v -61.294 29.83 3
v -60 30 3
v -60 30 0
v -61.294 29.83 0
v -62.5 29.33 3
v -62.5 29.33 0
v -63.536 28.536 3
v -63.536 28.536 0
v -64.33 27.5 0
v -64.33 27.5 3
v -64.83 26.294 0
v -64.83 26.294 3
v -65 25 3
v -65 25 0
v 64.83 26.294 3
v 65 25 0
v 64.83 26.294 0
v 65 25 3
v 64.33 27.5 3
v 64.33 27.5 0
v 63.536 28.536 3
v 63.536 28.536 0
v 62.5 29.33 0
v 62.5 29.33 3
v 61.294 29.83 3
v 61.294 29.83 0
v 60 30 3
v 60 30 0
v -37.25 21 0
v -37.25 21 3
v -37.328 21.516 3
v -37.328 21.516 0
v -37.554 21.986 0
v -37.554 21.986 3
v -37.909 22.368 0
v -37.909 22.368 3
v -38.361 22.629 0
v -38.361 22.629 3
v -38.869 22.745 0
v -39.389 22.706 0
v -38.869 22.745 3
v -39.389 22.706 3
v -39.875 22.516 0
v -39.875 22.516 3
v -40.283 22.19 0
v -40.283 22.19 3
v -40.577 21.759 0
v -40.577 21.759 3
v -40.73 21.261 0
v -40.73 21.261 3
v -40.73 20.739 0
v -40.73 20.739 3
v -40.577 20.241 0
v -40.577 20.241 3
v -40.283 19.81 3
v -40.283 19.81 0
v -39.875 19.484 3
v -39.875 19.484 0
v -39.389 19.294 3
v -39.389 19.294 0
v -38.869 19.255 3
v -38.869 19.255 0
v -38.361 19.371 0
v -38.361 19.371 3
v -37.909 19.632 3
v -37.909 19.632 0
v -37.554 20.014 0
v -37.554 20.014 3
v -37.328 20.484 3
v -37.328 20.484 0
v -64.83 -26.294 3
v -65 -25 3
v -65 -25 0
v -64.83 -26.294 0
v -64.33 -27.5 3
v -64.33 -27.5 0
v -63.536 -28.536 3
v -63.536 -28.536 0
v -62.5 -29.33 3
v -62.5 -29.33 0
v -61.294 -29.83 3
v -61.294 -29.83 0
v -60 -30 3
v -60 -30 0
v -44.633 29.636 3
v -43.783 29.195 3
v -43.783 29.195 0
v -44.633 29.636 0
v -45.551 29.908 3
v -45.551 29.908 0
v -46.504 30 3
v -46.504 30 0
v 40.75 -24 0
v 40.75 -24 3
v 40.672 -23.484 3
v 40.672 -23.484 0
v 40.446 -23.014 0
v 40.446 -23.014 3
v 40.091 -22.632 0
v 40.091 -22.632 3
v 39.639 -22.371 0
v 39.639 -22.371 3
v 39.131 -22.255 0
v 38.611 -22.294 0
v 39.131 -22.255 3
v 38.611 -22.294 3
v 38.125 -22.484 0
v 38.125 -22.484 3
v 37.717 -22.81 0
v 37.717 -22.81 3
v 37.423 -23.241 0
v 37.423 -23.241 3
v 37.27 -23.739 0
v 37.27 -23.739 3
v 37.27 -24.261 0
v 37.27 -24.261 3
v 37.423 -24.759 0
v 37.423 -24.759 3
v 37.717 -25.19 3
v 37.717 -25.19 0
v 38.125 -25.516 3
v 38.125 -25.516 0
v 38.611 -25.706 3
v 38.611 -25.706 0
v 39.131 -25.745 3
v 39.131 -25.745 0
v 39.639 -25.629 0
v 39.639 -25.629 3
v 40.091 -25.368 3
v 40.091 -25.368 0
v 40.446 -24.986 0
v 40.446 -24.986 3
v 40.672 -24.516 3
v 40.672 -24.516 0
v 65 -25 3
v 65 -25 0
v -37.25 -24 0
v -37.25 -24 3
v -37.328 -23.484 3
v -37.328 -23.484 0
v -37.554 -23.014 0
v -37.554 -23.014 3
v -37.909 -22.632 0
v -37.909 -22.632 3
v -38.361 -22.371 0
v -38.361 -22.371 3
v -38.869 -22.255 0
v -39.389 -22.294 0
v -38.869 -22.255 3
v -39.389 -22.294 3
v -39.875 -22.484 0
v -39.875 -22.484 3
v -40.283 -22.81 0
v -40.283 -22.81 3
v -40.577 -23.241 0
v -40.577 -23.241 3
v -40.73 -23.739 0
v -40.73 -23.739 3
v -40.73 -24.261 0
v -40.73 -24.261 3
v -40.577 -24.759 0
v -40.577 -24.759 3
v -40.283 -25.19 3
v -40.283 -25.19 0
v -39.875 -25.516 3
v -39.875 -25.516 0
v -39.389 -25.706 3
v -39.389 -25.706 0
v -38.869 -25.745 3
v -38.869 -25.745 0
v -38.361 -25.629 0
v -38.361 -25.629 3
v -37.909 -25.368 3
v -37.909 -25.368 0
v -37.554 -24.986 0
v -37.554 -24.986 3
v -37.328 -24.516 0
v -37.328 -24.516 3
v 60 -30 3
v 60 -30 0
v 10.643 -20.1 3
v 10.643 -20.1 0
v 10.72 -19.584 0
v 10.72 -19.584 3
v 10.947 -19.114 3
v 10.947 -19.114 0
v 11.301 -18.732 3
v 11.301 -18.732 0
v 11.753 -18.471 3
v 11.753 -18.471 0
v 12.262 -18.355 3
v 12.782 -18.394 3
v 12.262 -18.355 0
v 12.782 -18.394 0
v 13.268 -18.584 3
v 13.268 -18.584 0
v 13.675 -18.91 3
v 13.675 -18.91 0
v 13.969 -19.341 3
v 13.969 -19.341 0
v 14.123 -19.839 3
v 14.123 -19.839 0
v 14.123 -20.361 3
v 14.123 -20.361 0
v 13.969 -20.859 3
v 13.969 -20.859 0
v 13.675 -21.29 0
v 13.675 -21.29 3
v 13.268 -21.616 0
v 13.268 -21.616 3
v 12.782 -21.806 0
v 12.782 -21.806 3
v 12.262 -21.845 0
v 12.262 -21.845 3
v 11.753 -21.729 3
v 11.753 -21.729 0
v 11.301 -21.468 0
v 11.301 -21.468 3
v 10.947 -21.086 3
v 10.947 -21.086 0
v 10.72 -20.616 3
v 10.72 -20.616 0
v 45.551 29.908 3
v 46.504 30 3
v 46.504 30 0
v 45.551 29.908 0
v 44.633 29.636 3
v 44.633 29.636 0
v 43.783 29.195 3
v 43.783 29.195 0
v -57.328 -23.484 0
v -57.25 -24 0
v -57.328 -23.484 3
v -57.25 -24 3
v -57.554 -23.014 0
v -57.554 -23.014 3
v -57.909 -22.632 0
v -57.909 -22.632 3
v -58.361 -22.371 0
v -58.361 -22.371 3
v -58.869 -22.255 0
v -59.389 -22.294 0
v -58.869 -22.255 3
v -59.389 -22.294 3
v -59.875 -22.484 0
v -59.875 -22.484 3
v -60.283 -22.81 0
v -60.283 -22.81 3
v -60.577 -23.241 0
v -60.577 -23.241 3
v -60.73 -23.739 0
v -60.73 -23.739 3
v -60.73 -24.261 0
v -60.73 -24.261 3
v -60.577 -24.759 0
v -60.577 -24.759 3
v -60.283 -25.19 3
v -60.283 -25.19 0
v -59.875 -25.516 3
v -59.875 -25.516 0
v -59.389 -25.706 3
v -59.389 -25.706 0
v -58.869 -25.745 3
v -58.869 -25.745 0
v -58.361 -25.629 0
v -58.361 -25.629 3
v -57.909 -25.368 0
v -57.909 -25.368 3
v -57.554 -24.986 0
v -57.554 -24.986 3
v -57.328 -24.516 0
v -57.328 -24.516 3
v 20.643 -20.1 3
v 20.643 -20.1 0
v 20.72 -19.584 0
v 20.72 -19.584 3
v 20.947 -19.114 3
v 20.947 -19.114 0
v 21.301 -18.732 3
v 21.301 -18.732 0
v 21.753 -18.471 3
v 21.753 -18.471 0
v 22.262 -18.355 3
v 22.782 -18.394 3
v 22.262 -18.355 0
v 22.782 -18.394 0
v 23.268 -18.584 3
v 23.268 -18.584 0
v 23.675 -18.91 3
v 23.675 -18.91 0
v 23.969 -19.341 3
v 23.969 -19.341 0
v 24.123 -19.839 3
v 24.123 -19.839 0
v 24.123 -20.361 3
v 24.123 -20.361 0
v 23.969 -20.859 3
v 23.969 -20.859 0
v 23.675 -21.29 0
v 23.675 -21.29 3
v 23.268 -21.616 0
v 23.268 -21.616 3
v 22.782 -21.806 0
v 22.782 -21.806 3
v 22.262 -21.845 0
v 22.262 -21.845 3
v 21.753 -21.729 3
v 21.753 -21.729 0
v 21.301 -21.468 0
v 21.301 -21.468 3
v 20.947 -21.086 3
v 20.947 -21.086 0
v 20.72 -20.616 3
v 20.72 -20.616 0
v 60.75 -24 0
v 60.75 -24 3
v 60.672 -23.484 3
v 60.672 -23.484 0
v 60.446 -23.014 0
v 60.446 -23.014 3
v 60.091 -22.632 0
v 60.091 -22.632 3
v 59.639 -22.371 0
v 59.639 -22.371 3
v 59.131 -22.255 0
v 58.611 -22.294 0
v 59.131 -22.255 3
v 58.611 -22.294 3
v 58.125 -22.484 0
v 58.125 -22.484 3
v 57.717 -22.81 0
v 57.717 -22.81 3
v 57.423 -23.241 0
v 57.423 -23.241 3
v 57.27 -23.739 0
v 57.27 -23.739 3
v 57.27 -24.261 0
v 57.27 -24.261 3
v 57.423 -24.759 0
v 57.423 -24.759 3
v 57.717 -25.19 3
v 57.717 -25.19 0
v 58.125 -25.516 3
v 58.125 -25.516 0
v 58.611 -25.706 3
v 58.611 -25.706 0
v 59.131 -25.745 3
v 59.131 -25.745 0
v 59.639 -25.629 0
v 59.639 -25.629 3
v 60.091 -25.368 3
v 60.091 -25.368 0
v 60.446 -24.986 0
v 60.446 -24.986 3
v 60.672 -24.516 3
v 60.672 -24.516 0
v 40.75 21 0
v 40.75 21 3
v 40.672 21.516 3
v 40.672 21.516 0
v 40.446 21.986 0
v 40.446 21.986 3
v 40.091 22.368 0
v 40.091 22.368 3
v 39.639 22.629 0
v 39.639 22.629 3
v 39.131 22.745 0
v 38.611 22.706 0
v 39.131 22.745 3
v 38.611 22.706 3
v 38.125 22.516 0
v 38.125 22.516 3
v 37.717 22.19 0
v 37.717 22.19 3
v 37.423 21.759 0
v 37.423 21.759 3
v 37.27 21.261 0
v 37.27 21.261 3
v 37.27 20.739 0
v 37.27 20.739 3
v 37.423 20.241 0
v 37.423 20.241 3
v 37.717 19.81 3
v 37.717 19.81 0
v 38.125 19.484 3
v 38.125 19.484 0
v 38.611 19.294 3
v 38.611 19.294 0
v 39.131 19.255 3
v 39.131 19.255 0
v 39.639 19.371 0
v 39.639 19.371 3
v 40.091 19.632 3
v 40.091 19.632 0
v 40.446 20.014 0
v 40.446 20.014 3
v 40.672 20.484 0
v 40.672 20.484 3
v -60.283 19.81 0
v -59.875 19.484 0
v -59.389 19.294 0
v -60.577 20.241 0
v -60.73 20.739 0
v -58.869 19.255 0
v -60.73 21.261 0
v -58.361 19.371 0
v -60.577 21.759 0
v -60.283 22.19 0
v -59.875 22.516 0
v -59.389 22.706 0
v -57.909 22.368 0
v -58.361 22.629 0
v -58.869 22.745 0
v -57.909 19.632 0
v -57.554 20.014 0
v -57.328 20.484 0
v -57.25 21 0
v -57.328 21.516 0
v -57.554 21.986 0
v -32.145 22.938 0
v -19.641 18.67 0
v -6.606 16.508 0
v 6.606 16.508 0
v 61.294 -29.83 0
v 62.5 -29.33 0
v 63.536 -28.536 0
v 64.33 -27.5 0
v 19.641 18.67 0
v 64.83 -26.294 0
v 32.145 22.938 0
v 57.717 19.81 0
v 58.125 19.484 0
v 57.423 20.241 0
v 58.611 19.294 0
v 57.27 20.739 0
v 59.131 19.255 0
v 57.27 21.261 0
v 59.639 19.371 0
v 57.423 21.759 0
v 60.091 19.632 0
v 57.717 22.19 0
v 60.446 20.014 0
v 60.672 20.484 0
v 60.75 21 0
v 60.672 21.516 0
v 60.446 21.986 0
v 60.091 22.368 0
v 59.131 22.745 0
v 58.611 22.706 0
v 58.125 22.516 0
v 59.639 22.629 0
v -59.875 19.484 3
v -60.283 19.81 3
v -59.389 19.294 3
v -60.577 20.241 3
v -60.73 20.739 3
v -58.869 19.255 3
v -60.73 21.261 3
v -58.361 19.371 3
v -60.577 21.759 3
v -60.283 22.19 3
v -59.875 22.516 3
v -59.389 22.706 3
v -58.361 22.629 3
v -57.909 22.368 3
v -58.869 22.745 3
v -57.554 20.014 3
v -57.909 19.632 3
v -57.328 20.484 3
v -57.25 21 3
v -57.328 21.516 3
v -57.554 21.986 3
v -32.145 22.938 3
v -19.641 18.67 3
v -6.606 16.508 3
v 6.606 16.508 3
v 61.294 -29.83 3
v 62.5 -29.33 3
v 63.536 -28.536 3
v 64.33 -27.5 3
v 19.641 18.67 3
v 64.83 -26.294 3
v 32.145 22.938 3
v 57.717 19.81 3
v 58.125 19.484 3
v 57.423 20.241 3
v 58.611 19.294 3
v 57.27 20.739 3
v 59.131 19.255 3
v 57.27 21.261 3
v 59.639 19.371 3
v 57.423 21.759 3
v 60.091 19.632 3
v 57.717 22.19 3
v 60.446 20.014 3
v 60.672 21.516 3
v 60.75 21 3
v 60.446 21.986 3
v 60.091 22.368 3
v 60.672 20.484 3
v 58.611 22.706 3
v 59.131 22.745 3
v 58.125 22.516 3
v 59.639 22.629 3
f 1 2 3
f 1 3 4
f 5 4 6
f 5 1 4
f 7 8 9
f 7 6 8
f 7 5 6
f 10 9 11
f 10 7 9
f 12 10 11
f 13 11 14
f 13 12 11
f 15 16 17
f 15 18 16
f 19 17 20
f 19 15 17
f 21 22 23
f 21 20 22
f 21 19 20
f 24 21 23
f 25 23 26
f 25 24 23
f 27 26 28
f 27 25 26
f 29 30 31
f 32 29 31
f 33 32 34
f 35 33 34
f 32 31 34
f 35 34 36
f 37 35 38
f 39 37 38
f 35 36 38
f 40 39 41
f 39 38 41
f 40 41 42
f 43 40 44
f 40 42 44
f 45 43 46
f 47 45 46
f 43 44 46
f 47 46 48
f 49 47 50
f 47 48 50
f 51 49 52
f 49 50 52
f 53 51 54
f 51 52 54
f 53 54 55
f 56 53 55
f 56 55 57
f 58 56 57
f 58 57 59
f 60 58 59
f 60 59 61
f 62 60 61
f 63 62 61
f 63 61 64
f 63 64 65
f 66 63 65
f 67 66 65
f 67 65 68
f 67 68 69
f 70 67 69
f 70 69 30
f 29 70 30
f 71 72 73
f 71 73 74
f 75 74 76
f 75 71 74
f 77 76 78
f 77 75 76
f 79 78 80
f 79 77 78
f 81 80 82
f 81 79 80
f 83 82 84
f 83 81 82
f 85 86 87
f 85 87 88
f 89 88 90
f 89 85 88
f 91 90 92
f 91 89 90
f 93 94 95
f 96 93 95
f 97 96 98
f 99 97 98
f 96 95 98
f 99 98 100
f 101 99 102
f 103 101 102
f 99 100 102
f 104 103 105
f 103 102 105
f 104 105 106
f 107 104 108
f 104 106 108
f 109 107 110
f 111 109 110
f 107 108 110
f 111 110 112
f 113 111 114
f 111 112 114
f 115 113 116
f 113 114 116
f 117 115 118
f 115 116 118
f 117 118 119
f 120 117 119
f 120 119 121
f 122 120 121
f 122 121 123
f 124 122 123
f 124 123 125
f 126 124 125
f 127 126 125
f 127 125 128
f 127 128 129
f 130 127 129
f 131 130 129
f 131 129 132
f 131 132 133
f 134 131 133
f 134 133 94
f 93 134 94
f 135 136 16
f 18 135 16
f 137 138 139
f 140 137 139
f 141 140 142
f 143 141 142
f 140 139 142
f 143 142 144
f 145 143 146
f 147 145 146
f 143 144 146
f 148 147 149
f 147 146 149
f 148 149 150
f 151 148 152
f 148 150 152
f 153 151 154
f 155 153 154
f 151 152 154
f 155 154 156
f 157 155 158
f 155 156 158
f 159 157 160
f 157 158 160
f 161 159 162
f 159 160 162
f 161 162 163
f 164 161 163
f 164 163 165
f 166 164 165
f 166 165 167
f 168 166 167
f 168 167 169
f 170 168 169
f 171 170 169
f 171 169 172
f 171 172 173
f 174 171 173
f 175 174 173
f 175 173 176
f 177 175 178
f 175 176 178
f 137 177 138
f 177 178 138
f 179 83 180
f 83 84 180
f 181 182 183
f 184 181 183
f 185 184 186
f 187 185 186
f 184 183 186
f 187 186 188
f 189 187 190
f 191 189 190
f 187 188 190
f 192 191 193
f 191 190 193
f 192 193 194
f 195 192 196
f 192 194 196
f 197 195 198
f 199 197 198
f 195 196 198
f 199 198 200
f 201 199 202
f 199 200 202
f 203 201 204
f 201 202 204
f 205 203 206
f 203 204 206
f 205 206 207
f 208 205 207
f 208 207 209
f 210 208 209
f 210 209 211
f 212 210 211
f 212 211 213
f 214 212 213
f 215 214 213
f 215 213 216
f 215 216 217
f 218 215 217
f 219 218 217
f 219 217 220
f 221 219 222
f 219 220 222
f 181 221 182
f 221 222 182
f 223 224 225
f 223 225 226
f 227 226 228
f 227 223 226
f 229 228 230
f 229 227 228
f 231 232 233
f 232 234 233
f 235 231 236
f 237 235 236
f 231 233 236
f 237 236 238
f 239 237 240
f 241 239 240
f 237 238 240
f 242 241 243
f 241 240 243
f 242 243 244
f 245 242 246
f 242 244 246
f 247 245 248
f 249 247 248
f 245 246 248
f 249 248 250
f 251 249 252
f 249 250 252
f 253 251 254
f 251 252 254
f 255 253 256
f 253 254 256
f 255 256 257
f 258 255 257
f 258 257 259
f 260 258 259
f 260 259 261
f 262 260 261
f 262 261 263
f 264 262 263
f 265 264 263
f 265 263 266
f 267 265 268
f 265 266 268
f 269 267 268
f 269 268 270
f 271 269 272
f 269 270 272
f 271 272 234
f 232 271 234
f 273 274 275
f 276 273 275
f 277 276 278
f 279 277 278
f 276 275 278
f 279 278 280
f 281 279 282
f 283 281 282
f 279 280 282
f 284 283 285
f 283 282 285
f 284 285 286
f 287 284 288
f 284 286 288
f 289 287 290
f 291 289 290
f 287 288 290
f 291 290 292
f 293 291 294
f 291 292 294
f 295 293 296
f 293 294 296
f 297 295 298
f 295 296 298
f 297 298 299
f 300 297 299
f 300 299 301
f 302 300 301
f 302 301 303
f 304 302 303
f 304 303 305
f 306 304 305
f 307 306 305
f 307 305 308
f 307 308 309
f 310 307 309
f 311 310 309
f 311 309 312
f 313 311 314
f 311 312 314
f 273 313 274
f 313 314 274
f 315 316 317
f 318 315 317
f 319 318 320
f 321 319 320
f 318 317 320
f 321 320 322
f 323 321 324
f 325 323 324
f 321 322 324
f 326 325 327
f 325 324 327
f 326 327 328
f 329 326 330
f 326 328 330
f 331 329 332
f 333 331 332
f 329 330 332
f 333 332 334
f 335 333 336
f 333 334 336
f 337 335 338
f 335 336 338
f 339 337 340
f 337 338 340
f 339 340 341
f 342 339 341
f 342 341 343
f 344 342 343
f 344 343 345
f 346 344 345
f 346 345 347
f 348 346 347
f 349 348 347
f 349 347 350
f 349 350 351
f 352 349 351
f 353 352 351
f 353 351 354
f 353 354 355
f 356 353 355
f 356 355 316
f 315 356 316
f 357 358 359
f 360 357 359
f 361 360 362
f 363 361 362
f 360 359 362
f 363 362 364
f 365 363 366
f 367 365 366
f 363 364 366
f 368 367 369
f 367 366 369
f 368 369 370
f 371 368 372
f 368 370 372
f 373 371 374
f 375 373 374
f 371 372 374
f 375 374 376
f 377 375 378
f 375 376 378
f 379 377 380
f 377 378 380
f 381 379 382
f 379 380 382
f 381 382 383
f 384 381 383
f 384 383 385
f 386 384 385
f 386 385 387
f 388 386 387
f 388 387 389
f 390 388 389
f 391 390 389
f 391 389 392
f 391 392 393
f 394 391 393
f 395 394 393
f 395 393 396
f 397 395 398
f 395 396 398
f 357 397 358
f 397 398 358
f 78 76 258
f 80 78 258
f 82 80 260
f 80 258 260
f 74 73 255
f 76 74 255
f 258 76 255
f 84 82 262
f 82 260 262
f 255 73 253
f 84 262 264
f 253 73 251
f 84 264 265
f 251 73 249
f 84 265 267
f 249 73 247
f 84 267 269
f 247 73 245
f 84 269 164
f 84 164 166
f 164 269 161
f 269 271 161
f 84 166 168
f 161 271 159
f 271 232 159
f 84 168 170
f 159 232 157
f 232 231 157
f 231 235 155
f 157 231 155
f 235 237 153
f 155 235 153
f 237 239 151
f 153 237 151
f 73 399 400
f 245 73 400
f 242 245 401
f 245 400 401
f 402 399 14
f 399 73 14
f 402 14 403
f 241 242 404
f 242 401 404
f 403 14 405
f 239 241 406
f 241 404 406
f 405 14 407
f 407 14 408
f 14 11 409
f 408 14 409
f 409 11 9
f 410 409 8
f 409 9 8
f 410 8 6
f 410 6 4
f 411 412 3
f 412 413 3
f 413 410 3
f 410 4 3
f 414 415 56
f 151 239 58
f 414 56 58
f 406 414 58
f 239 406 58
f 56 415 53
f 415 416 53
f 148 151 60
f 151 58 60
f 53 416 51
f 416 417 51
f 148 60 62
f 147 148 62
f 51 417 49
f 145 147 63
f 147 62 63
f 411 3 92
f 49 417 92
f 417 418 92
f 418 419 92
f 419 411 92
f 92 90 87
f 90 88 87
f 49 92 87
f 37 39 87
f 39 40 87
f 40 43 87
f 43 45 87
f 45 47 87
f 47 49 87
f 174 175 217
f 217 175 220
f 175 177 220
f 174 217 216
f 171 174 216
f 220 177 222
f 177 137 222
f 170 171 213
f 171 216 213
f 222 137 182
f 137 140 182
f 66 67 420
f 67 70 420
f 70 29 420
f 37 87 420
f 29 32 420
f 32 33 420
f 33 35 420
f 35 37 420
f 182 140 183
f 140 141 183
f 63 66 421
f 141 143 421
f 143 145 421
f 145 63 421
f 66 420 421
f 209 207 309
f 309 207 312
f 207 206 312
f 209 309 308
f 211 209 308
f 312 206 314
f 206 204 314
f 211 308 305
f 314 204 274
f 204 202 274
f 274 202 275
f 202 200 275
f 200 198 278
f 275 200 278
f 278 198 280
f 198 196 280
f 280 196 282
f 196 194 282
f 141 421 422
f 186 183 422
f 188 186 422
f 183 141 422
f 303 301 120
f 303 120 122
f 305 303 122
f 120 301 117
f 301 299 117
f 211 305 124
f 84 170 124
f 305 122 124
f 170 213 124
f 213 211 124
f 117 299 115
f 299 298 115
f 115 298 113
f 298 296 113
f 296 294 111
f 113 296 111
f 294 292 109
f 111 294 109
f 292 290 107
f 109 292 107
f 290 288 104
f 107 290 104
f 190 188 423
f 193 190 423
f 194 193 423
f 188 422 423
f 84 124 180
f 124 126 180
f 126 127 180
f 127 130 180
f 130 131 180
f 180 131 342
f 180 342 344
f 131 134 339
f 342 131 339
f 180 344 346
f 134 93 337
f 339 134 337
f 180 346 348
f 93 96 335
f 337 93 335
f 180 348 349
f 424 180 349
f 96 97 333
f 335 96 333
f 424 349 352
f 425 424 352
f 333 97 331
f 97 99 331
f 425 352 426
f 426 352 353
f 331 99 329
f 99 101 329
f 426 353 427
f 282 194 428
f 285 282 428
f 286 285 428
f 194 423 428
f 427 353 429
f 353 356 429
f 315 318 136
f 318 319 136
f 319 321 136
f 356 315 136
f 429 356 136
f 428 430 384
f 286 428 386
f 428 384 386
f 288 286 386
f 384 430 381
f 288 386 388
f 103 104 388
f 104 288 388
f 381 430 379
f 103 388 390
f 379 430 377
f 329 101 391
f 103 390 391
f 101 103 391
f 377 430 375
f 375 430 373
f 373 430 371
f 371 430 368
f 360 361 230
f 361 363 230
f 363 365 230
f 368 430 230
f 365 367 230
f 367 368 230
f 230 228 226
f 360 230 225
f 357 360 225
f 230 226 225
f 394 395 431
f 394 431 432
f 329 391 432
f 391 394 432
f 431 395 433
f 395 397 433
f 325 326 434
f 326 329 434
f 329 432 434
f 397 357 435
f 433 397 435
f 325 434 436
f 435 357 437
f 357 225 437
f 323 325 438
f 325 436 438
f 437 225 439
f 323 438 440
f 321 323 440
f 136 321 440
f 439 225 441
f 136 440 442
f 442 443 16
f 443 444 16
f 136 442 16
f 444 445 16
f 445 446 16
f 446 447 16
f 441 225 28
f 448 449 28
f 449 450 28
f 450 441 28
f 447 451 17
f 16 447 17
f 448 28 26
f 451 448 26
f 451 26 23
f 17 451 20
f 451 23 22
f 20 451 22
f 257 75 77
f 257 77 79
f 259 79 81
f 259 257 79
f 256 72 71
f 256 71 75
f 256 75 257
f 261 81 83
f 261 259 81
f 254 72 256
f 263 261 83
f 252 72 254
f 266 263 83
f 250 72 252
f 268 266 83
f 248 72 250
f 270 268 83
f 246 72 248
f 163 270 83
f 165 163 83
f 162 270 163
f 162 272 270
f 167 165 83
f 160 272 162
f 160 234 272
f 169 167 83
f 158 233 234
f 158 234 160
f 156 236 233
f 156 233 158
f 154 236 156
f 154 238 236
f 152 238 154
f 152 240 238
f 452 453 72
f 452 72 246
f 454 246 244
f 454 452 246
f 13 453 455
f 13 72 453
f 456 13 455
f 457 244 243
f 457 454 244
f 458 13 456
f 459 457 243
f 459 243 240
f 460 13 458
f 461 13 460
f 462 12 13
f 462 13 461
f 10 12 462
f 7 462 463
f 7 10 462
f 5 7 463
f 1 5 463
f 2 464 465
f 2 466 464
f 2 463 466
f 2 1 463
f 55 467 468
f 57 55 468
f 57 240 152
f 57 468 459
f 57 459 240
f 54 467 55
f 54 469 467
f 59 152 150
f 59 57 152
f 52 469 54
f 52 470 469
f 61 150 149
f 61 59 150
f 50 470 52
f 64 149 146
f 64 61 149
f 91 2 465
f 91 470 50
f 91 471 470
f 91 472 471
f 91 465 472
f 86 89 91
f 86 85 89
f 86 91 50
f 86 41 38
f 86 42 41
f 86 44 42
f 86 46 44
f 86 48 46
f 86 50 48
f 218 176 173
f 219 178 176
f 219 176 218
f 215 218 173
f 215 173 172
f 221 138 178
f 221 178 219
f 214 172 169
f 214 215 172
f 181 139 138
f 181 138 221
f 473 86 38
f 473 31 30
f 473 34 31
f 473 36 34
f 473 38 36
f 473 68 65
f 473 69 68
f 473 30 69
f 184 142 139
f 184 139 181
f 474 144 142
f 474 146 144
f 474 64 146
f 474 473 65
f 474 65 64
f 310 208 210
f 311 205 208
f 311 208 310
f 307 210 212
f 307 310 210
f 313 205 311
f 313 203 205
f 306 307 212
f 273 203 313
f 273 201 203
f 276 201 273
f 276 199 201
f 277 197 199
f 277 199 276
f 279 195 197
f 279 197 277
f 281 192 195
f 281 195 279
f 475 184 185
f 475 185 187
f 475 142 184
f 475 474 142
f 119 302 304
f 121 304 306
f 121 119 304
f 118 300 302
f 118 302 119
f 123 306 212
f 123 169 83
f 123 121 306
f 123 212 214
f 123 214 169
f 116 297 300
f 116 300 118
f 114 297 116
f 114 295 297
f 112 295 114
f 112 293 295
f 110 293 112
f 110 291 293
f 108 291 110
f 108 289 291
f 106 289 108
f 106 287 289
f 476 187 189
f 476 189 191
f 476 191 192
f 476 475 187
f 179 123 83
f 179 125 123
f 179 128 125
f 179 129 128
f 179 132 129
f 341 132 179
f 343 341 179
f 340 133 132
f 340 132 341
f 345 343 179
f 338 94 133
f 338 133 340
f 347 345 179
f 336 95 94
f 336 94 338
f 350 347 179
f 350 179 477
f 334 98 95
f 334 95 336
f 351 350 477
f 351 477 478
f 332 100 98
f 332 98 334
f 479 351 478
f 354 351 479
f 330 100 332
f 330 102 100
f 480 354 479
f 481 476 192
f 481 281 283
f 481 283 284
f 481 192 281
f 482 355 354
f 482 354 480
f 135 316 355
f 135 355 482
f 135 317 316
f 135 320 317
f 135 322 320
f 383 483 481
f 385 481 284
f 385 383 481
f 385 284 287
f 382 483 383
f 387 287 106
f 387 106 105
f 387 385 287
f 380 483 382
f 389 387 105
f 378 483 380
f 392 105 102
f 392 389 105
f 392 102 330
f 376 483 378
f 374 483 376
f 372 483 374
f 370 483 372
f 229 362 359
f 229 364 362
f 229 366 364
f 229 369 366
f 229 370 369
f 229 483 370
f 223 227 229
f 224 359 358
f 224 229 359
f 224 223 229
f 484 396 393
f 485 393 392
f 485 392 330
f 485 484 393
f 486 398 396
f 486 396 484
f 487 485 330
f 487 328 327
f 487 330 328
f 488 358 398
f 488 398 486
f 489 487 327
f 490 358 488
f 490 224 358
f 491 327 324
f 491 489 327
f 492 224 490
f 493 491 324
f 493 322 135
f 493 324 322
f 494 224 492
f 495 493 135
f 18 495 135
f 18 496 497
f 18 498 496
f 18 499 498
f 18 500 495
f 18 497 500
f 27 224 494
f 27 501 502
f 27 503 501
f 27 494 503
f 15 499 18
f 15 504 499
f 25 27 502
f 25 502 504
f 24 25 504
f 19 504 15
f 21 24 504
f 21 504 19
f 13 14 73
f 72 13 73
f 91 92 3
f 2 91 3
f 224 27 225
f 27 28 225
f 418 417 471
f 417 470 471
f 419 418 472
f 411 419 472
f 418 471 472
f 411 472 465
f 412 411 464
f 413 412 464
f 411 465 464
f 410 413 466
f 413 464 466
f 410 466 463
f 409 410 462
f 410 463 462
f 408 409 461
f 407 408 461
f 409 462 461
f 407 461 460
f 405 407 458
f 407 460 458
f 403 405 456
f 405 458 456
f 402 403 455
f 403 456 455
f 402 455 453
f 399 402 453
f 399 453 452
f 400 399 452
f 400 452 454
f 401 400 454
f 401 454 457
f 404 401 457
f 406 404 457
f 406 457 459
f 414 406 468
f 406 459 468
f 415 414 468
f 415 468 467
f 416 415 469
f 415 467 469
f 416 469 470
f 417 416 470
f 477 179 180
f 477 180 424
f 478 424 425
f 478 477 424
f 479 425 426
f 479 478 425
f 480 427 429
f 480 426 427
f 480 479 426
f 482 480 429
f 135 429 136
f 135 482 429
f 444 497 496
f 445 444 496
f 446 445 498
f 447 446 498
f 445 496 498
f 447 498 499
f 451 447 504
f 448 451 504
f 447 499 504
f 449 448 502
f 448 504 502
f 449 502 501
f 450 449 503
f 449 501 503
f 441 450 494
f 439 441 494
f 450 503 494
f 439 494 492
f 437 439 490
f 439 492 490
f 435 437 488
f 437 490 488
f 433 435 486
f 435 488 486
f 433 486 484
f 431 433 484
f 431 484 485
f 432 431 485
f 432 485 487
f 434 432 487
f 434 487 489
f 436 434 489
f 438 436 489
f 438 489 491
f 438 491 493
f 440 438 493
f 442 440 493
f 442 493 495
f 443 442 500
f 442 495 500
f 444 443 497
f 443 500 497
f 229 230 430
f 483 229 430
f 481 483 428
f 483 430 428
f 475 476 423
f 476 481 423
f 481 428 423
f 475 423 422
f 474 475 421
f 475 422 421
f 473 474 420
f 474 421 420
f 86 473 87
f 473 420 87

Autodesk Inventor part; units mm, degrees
ref_plane "YZ Plane" through (0, 0, 0) normal (1, 0, 0) x (0, 1, 0)
ref_plane "XZ Plane" through (0, 0, 0) normal (0, 1, 0) x (-1, 0, 0)
ref_plane "XY Plane" through (0, 0, 0) normal (0, 0, 1) x (1, 0, 0)
sketch "Sketch1" plane through (0, 0, 0) normal (0, 0, 1) x (1, 0, 0)
  line L0 (-65, -30) -> (65, -30)
  line L1 (65, -30) -> (65, 30)
  line L2 (65, 30) -> (-65, 30)
  line L3 (-65, 30) -> (-65, -30)
  line L4 (-65, -30) -> (65, 30) construction
  line L5 (65, -30) -> (-65, 30) construction
  arc A0 (-45, 30) -> (45, 30) centre (0, 96.6789) ccw
  point P0 (0, 0)
  dimension "d0" = 130
  dimension "d1" = 60
  dimension "d5" = 20
  dimension "d6" = 20
extrude "Extrusion1" add sketch "Sketch1" along normal blind 3 contours L3 L2 A0 L1 L0
fillet "Fillet1" radius 5 6 edges at (65, 30, 1.5) (65, -30, 1.5) (-65, -30, 1.5) (-65, 30, 1.5) (45, 30, 1.5) (-45, 30, 1.5)
sketch "Sketch2" plane through (0, 0, 3) normal (0, 0, 1) x (1, 0, 0)
  circle A0 centre (59, -24) radius 1.75
  circle A1 centre (39, -24) radius 1.75
  line L0 (65, -25) -> (65, 25) projected
  line L1 (-60, -30) -> (60, -30) projected
  circle A2 centre (59, 21) radius 1.75
  circle A3 centre (39, 21) radius 1.75
  line L2 (0, -30) -> (0, -45.4947)
  circle A4 centre (-59, -24) radius 1.75
  circle A5 centre (-39, -24) radius 1.75
  line L3 (-65, -25) -> (-65, 25)
  circle A6 centre (-59, 21) radius 1.75
  circle A7 centre (-39, 21) radius 1.75
  point P0 (0, 0)
  dimension "d7" = 3.5
  dimension "d8" = 3.5
  dimension "d9" = 20
  dimension "d10" = 6
  dimension "d11" = 6
  dimension "d14" = 45
extrude "Extrusion2" cut sketch "Sketch2" against normal up to surface (3 mm away)
sketch "Sketch3" plane through (0, 0, 0) normal (0, 0, -1) x (-1, 0, 0)
  circle A0 centre (-12.3926, -20.1) radius 1.75 projected
  circle A1 centre (-22.3926, -20.1) radius 1.75 projected
  point P0 (0, 0)
extrude "Extrusion3" cut sketch "Sketch3" against normal up to surface (3 mm away)
equation "\"d6\" = d5"
properties part number "Base plate"
